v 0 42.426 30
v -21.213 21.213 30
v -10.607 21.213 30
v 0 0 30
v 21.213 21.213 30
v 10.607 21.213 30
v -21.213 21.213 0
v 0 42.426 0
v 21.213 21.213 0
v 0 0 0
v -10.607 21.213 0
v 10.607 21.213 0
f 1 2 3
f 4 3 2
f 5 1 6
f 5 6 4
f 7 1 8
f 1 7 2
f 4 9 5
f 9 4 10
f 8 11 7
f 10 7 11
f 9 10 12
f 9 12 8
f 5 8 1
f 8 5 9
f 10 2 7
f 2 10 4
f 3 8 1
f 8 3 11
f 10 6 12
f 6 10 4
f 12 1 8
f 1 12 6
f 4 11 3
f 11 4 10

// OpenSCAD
rotate([0,-90,0]){
    difference(){
        rotate([-45,0,0]) {
            cube([30, 30, 30]);
        }
        scale([1,1,0.5]) {
            rotate([-45,0,0]) {
                cube([30, 30, 30]);
            }
        }
    }
}
